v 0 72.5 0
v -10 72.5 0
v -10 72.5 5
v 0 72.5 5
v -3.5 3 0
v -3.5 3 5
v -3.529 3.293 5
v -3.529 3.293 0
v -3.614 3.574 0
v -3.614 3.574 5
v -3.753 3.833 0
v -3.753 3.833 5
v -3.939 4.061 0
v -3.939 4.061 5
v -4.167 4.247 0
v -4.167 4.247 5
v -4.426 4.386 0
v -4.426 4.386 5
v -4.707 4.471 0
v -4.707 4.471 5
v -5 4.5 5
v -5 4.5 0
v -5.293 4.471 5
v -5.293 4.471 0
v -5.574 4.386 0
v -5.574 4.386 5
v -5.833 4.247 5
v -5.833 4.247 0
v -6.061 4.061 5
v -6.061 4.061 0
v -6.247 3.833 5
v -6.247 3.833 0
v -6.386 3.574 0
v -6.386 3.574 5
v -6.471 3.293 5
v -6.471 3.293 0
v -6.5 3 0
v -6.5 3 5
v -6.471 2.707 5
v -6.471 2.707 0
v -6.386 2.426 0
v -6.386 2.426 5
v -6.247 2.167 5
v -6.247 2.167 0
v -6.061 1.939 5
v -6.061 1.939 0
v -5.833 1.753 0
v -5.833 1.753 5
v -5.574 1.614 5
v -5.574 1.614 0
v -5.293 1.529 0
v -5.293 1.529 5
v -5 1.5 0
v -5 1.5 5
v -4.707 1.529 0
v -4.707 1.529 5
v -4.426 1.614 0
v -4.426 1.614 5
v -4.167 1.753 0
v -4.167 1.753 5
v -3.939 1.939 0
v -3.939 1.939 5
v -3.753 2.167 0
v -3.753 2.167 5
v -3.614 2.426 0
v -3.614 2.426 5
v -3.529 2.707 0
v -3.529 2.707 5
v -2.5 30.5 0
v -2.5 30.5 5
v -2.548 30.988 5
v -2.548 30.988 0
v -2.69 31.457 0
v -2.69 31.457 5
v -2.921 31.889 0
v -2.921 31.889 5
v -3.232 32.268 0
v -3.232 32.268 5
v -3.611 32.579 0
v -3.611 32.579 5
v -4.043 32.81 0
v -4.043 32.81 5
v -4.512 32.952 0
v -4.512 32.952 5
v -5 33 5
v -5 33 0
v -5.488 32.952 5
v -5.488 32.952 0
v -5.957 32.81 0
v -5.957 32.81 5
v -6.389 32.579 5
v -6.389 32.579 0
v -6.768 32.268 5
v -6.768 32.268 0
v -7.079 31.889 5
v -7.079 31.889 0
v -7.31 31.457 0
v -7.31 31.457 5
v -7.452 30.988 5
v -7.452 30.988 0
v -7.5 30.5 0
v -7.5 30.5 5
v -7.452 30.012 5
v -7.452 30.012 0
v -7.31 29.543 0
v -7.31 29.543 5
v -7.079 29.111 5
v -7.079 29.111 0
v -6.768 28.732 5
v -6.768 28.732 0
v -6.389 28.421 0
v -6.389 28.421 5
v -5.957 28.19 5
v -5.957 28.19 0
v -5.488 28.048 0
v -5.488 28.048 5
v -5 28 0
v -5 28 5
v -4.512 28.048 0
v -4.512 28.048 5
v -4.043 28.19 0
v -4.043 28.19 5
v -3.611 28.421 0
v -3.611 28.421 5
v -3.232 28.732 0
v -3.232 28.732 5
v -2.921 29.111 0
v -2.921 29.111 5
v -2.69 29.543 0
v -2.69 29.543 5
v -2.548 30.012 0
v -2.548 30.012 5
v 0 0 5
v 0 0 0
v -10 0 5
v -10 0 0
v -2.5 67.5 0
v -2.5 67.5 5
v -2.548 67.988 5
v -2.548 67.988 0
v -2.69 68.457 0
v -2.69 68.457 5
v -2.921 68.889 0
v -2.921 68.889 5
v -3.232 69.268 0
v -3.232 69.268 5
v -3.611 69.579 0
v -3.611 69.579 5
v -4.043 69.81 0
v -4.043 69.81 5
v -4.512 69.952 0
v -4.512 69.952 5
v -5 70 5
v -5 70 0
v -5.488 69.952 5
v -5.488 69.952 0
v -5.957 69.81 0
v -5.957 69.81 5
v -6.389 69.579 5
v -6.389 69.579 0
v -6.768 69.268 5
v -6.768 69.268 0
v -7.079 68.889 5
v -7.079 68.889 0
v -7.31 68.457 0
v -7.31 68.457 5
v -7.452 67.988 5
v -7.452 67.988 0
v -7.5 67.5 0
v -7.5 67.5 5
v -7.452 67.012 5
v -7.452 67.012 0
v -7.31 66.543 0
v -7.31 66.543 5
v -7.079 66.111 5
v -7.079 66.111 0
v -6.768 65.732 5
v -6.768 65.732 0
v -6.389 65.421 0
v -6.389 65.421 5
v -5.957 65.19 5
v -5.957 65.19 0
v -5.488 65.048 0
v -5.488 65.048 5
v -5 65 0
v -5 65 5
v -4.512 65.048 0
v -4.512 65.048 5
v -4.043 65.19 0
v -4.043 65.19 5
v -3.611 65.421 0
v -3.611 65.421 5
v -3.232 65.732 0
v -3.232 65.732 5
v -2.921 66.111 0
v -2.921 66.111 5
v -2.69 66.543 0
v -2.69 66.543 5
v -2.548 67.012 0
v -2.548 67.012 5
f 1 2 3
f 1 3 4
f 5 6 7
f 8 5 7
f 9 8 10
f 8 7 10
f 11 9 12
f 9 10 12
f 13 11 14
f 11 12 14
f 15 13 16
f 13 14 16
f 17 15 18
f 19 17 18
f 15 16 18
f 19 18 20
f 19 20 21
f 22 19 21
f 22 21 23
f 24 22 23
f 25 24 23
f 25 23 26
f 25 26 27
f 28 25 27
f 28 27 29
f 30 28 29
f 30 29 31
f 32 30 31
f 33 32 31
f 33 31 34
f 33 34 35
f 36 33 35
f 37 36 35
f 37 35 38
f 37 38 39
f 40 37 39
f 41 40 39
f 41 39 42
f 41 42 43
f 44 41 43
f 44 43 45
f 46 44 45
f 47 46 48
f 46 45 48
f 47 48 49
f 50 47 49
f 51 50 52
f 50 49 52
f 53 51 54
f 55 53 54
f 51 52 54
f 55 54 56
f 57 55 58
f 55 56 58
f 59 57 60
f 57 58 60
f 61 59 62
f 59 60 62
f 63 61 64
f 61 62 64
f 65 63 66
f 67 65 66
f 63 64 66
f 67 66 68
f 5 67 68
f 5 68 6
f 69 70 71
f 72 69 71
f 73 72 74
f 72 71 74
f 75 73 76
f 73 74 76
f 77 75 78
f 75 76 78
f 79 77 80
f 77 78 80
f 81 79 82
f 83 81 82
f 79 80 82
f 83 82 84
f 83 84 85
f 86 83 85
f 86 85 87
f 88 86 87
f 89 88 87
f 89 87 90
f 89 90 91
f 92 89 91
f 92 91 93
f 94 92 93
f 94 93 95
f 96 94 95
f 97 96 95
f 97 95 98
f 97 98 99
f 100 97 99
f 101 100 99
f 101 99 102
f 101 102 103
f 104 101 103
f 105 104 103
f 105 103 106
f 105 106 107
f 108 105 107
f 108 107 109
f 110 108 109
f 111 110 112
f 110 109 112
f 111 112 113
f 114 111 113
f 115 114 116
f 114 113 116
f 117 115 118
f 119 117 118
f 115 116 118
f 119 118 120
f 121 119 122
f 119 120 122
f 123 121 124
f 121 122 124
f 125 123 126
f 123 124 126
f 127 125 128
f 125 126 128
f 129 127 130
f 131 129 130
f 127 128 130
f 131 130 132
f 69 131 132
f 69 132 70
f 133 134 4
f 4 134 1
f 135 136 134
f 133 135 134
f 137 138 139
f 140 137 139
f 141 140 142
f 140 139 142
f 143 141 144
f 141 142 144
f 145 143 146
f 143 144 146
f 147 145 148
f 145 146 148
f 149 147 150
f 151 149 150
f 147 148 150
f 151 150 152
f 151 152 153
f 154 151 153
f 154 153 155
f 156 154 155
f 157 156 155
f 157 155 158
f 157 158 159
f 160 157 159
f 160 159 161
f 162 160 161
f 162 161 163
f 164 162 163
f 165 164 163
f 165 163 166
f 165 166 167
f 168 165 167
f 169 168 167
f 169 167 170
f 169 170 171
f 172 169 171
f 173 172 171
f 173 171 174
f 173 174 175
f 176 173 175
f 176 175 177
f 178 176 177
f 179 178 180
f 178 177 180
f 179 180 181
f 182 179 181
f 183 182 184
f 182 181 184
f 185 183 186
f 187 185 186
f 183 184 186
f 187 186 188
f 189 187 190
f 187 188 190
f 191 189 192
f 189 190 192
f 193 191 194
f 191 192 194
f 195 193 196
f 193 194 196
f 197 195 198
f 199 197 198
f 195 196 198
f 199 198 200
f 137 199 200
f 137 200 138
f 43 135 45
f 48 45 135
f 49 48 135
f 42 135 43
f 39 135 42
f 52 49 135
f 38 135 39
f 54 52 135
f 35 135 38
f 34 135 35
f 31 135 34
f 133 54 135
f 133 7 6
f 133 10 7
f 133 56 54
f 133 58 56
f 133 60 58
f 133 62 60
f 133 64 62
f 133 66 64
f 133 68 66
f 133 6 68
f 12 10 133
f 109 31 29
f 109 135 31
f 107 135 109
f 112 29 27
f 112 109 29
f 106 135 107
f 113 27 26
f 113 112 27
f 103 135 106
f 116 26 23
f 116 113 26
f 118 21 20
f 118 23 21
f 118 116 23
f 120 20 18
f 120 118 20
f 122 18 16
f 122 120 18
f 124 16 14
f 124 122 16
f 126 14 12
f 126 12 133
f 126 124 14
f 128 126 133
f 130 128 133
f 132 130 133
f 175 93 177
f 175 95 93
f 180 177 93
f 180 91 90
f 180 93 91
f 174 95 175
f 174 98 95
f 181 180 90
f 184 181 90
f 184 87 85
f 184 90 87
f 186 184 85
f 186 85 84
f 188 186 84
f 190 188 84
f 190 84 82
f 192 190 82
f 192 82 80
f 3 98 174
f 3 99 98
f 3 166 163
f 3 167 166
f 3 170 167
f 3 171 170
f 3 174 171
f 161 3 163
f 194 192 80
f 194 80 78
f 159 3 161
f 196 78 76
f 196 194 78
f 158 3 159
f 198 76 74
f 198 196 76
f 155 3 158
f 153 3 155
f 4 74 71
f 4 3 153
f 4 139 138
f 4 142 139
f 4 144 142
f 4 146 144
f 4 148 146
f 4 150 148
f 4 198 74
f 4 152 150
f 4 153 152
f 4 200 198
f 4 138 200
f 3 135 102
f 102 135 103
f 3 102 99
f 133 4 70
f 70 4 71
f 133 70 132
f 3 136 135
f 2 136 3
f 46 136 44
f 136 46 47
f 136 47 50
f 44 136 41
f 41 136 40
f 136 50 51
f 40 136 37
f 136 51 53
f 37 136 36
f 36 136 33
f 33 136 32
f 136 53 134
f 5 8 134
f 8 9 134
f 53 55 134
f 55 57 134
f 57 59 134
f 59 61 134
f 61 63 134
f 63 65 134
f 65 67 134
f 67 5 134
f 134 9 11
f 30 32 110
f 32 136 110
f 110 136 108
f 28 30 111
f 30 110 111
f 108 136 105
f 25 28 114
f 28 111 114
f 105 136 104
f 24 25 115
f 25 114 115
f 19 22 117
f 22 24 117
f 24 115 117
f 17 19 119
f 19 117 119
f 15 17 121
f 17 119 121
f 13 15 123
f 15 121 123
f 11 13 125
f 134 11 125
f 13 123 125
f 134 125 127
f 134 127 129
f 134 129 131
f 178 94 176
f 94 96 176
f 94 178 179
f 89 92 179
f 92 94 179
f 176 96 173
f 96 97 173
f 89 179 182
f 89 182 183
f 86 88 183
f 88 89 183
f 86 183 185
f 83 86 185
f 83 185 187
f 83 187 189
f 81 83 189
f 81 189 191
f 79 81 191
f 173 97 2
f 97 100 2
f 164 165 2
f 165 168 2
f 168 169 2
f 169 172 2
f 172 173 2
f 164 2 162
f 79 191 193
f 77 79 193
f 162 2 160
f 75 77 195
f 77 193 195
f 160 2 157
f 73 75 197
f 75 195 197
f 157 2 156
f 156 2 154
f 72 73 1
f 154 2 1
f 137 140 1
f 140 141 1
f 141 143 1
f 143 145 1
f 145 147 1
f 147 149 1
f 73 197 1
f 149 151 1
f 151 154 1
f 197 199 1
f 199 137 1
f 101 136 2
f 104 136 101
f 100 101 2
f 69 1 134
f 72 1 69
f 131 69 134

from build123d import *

# Parameters (mm, degrees)
SKETCH1_W           = 10
SKETCH1_H           = 72.5
BOSS_EXTRUDE1_DEPTH = 5
SKETCH2_R           = 2.5
CUT_EXTRUDE1_DEPTH  = 6
SKETCH3_R           = 1.5
SKETCH3_R_2         = 2.5
CUT_EXTRUDE2_DEPTH  = 6


with BuildPart() as part:
    # Sketch1 → Boss-Extrude1 (new body)
    with BuildSketch(Plane.XY):
        with Locations((-5, 36.25)):
            Rectangle(SKETCH1_W, SKETCH1_H)
    extrude(amount=BOSS_EXTRUDE1_DEPTH)

    # Sketch2 → Cut-Extrude1 (cut, through all)
    with BuildSketch(Plane.XY.offset(5)):
        with Locations((-5, 67.5)):
            Circle(SKETCH2_R)
    extrude(amount=-CUT_EXTRUDE1_DEPTH, mode=Mode.SUBTRACT)

    # Sketch3 → Cut-Extrude2 (cut, through all)
    with BuildSketch(Plane.XY.offset(5)):
        with Locations((-5, 3)):
            Circle(SKETCH3_R)
        with Locations((-5, 30.5)):
            Circle(SKETCH3_R_2)
    extrude(amount=-CUT_EXTRUDE2_DEPTH, mode=Mode.SUBTRACT)


solid = part.part
